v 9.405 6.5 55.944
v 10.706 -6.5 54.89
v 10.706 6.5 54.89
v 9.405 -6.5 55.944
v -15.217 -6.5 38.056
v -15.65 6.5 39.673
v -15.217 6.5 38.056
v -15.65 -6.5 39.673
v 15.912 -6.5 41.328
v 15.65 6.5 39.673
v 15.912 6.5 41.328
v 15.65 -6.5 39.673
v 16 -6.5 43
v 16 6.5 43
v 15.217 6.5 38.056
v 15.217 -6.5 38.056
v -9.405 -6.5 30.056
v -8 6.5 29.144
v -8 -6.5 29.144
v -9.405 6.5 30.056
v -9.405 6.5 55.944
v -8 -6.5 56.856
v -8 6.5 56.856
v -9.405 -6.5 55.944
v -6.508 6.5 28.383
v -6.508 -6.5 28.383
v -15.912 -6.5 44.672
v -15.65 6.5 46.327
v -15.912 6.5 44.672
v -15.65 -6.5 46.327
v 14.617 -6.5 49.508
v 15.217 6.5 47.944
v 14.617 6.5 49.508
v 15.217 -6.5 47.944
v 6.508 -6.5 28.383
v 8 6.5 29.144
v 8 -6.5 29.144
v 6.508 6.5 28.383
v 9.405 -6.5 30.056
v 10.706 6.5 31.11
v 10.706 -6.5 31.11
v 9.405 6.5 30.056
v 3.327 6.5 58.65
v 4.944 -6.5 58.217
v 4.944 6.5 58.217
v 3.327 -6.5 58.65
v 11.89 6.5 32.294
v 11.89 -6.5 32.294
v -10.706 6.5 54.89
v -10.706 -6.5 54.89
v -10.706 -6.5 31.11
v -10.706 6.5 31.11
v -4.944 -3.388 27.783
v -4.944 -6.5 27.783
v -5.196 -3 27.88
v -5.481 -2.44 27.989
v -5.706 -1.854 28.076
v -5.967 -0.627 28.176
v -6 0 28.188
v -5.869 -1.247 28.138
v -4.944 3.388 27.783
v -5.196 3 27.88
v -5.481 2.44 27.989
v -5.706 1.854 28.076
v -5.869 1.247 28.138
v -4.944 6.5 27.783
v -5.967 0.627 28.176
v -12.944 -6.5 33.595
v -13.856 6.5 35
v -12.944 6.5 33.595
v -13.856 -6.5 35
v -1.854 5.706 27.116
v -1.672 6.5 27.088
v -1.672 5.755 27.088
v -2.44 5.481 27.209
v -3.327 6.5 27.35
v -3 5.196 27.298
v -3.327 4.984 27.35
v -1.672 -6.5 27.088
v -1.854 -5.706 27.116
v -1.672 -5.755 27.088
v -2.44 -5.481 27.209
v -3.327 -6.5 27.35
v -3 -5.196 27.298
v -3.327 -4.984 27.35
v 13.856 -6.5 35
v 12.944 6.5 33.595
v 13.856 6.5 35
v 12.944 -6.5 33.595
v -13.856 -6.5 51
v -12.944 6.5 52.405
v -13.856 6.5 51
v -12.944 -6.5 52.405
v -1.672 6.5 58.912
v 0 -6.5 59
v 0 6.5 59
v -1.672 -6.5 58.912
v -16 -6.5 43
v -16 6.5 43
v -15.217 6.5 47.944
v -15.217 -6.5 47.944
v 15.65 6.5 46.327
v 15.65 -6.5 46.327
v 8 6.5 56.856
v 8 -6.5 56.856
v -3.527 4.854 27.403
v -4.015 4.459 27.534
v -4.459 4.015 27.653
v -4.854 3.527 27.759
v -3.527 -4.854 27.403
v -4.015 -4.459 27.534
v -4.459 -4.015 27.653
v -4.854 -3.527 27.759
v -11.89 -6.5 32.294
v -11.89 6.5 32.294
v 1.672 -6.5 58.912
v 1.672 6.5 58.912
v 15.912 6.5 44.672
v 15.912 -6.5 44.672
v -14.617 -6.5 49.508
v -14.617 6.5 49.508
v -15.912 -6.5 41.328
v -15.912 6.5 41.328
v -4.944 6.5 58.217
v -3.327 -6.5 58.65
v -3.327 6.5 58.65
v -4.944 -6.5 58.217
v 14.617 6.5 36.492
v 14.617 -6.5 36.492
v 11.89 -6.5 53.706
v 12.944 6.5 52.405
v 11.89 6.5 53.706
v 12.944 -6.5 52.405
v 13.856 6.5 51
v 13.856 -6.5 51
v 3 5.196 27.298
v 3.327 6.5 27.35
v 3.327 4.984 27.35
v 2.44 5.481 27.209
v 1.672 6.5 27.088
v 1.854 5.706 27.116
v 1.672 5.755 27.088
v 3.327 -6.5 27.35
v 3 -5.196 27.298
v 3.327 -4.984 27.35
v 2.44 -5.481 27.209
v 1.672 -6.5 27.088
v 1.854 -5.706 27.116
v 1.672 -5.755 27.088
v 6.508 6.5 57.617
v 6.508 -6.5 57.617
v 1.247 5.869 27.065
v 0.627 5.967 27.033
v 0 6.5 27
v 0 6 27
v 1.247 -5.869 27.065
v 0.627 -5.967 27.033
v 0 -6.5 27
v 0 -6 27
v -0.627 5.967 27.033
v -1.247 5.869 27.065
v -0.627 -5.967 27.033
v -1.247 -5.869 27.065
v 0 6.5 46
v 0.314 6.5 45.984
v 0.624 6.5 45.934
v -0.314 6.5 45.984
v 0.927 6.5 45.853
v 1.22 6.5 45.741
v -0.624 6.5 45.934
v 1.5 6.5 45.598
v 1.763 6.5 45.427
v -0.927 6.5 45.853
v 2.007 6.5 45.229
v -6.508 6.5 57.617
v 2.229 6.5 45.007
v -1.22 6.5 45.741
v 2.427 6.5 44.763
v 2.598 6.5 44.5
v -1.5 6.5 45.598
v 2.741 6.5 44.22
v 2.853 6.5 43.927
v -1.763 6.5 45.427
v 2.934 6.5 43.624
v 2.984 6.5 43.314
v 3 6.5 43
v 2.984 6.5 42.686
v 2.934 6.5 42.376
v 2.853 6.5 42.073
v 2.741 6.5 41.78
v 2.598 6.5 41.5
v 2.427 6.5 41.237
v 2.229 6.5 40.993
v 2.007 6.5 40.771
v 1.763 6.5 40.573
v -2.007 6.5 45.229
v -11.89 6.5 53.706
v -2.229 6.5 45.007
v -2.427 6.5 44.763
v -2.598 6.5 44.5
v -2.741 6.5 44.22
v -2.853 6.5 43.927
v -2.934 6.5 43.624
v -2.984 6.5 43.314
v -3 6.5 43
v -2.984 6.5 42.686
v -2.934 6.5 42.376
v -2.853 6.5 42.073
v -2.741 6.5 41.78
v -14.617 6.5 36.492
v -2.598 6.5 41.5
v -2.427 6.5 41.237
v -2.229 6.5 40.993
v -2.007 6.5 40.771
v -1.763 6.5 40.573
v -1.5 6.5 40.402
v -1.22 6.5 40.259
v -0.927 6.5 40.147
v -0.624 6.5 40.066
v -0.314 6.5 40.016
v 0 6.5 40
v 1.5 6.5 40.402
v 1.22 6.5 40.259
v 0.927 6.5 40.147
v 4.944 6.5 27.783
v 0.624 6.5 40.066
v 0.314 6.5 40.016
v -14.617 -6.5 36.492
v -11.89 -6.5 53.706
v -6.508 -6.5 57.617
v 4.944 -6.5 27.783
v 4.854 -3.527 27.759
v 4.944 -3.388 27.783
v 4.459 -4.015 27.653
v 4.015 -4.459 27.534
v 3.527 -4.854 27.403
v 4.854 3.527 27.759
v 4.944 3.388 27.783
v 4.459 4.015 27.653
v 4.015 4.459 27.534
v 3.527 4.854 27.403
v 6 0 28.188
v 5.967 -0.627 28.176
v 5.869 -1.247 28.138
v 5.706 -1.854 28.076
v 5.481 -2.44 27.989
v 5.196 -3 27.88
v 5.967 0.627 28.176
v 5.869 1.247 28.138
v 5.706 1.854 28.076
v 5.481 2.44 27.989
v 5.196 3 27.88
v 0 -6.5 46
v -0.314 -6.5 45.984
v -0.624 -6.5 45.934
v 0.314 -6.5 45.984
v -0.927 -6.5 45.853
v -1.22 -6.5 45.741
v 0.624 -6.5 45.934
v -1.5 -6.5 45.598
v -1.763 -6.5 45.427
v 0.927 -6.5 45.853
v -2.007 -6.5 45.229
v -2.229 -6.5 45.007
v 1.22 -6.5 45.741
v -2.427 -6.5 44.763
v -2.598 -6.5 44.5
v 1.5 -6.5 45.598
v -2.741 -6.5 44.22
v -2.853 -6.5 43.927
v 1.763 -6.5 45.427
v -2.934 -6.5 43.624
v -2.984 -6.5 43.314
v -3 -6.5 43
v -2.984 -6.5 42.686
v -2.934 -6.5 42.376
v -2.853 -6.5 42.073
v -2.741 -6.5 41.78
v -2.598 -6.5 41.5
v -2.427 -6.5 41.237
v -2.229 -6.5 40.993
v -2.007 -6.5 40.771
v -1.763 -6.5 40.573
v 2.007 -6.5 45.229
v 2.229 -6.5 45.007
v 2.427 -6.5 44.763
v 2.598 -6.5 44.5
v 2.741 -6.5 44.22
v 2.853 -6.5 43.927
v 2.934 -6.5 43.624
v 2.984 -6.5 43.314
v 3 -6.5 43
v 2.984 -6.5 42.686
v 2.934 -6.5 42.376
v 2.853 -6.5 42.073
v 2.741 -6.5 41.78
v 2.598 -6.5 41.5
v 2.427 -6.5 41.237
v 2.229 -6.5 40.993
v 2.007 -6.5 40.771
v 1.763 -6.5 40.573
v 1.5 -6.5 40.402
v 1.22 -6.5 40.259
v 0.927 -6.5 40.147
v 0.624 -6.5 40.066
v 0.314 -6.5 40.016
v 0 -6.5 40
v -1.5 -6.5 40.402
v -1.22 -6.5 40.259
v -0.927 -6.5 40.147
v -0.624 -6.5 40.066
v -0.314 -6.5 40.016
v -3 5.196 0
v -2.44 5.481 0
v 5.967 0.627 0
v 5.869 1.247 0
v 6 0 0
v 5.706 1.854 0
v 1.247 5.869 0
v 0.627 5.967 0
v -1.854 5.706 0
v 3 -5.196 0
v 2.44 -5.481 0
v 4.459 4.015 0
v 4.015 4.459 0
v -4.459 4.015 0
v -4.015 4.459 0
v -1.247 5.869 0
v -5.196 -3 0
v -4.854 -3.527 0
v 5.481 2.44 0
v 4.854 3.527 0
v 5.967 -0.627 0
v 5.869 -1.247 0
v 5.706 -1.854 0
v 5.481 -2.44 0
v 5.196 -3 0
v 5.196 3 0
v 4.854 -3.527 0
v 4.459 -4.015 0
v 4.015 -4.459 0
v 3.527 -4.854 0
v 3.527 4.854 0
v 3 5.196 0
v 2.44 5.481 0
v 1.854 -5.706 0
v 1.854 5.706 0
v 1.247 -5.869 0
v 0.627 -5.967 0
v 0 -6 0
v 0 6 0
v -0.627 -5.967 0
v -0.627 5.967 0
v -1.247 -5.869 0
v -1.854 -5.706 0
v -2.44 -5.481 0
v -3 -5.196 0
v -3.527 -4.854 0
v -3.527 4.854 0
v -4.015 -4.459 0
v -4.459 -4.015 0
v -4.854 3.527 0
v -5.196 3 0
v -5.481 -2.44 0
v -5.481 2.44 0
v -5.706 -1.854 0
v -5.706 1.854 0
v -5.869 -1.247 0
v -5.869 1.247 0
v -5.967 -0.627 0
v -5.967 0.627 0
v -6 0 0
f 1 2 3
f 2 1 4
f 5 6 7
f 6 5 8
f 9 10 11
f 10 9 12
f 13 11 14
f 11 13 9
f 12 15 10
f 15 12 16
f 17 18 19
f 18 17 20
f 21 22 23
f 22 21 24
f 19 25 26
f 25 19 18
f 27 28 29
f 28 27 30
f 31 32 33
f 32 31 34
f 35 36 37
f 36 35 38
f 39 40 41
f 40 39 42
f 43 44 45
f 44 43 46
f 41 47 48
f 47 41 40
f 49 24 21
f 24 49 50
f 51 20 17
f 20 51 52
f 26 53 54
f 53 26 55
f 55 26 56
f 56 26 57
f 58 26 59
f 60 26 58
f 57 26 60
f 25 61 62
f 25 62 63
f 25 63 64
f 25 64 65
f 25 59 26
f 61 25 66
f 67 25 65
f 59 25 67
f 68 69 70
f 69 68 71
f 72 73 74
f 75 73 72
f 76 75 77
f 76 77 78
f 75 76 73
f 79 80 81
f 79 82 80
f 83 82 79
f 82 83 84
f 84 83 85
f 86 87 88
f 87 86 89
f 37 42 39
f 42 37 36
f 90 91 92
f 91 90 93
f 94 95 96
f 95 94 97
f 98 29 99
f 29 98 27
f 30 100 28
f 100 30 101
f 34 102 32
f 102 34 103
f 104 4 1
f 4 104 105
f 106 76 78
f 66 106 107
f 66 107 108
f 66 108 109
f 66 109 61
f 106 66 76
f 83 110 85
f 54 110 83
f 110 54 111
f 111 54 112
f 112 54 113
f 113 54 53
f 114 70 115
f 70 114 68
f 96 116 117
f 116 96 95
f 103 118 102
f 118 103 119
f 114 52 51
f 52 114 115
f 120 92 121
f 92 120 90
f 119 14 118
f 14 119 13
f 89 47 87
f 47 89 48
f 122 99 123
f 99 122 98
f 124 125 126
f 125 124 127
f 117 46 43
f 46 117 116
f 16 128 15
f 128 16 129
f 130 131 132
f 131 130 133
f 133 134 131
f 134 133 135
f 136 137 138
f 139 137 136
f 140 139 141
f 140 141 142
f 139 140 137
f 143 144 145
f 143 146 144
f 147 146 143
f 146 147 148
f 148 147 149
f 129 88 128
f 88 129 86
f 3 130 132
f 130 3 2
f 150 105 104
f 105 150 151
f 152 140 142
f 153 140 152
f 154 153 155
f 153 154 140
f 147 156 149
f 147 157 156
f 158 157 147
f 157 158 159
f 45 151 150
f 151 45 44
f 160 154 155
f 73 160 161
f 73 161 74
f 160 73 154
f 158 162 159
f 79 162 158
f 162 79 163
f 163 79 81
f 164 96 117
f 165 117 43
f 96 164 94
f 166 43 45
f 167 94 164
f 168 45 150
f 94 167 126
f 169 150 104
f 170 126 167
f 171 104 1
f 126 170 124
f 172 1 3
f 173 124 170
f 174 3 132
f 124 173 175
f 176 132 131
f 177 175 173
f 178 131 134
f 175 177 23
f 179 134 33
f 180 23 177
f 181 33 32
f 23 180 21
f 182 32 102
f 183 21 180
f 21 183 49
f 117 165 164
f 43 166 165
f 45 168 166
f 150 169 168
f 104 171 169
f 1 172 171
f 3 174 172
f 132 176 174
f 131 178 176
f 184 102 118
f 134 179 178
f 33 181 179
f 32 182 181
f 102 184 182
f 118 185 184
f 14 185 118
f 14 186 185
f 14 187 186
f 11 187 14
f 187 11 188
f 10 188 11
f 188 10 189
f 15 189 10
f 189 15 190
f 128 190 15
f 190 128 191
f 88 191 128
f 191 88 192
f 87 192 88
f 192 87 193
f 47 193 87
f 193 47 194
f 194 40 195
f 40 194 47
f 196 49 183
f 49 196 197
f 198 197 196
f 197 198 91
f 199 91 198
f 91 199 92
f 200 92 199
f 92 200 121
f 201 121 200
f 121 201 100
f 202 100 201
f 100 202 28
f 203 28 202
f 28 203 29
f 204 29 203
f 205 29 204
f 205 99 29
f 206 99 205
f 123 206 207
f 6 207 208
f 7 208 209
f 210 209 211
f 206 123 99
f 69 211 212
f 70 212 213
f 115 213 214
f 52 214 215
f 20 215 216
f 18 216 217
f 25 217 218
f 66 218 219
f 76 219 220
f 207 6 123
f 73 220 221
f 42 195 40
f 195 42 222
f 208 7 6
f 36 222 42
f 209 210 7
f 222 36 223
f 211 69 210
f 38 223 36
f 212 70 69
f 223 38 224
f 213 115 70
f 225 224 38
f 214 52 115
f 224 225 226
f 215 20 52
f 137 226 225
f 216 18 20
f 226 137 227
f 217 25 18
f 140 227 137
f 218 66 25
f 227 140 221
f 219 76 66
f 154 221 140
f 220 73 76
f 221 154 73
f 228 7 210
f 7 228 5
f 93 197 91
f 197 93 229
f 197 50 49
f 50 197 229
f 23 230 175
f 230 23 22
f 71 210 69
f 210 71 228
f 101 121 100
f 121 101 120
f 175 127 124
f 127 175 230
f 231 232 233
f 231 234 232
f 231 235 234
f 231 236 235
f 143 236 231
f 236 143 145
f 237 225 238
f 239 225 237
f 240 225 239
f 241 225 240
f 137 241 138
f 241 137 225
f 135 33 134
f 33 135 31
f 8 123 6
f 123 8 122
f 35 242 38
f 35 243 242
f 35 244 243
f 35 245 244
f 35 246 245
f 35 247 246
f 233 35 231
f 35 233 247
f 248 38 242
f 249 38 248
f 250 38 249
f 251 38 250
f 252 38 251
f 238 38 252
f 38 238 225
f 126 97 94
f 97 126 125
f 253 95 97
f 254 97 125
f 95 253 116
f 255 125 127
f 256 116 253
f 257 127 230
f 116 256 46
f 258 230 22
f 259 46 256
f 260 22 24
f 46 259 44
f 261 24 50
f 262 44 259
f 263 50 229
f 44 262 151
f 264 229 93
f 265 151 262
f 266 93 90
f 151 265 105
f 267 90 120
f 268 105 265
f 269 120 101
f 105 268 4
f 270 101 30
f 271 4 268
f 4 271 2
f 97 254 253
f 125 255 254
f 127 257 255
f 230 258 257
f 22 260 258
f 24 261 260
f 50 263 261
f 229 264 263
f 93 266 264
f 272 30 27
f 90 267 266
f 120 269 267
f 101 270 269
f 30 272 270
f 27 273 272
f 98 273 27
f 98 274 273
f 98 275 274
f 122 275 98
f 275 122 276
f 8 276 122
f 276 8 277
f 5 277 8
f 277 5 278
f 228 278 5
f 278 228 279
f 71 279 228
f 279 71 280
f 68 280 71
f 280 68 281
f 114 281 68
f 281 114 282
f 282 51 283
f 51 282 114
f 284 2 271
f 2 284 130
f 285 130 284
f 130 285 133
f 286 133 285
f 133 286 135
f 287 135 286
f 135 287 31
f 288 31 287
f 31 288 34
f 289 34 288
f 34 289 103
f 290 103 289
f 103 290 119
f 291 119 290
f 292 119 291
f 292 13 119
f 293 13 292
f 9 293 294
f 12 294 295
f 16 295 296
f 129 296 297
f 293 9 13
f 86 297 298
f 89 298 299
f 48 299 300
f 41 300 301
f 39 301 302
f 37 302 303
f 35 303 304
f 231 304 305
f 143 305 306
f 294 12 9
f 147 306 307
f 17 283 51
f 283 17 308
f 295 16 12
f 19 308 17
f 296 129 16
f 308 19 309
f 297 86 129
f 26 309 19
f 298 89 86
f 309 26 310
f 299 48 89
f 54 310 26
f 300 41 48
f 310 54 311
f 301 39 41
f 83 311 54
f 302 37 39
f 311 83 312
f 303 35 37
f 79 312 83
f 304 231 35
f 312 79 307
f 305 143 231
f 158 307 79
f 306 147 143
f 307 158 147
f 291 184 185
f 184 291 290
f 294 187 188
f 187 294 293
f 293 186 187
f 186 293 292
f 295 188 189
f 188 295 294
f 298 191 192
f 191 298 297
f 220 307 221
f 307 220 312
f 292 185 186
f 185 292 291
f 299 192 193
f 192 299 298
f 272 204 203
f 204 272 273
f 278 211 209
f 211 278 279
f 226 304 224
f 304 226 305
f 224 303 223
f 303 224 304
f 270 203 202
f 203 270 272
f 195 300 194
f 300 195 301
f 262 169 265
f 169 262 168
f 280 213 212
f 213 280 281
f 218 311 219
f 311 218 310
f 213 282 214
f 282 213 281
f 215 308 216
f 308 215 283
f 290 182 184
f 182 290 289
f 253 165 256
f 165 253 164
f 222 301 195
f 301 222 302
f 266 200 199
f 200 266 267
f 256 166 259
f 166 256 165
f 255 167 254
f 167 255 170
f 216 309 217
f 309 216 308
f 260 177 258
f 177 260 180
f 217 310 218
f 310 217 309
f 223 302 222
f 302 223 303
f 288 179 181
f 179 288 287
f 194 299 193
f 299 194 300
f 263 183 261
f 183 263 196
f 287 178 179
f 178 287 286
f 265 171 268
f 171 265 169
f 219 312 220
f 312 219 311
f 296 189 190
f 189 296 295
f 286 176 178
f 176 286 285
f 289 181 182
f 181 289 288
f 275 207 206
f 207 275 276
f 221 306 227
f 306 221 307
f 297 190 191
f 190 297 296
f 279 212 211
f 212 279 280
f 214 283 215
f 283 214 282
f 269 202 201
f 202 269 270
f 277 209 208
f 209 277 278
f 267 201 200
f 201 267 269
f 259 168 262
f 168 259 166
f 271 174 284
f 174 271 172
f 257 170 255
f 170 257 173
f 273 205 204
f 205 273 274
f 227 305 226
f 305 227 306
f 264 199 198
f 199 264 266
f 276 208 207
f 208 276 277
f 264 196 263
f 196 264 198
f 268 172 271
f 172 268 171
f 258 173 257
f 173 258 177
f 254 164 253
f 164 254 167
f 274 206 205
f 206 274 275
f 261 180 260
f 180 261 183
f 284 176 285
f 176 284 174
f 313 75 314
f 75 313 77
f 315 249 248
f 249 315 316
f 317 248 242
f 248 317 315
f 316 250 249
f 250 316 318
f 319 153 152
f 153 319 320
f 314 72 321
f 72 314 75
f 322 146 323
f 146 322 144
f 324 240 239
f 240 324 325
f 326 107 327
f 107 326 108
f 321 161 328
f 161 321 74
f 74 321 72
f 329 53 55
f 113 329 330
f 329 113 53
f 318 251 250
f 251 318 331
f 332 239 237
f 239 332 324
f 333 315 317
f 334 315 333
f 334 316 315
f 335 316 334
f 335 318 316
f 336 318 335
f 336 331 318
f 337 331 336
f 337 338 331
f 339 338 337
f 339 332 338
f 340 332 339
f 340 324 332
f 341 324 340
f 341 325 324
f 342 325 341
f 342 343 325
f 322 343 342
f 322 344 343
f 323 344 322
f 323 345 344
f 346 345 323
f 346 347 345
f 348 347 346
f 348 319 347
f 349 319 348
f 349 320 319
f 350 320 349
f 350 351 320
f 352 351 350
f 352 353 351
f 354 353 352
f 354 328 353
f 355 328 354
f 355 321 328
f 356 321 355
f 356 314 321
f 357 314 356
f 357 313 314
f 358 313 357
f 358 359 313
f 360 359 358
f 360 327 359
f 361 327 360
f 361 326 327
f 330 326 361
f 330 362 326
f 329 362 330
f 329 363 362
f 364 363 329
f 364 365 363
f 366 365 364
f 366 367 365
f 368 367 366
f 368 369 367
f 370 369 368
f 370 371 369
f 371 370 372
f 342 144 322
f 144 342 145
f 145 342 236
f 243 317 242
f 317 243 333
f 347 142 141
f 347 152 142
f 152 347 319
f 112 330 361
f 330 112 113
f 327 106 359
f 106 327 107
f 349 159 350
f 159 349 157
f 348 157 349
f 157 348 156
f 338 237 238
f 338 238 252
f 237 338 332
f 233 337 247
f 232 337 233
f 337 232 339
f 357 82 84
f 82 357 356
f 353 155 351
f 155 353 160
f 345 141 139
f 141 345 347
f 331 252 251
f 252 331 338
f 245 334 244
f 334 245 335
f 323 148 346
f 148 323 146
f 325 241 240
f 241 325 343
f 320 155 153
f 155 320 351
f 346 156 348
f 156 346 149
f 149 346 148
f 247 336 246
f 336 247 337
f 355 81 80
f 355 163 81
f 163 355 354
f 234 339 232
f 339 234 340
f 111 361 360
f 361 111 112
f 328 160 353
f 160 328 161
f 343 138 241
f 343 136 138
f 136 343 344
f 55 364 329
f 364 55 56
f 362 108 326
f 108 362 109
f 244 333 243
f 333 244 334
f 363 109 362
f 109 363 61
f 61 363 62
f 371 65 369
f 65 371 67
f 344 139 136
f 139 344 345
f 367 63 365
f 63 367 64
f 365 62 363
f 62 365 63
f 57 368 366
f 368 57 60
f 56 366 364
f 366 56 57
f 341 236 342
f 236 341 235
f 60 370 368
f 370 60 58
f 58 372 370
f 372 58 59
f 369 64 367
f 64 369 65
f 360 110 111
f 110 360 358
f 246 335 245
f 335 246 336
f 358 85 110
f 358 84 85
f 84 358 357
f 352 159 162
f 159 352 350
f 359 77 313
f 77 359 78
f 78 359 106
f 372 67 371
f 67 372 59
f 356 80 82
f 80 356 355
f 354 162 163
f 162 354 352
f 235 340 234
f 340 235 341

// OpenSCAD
// Flat-eye bolt with a smooth shaft.
$fn = 60;
eps = 0.02;
shaft_d = 12;
shaft_l = 28;
eye_outer_d = 32;
eye_inner_d = eye_outer_d - 2 * 13;
eye_t = 13;
module eye() {
    translate([0, -eye_t / 2, shaft_l + eye_outer_d / 2 - 1]) rotate([-90, 0, 0])
        difference() { cylinder(d = eye_outer_d, h = eye_t); translate([0, 0, -eps]) cylinder(d = eye_inner_d, h = eye_t + 2 * eps); }
}
union() { cylinder(d = shaft_d, h = shaft_l + 2); eye(); }
